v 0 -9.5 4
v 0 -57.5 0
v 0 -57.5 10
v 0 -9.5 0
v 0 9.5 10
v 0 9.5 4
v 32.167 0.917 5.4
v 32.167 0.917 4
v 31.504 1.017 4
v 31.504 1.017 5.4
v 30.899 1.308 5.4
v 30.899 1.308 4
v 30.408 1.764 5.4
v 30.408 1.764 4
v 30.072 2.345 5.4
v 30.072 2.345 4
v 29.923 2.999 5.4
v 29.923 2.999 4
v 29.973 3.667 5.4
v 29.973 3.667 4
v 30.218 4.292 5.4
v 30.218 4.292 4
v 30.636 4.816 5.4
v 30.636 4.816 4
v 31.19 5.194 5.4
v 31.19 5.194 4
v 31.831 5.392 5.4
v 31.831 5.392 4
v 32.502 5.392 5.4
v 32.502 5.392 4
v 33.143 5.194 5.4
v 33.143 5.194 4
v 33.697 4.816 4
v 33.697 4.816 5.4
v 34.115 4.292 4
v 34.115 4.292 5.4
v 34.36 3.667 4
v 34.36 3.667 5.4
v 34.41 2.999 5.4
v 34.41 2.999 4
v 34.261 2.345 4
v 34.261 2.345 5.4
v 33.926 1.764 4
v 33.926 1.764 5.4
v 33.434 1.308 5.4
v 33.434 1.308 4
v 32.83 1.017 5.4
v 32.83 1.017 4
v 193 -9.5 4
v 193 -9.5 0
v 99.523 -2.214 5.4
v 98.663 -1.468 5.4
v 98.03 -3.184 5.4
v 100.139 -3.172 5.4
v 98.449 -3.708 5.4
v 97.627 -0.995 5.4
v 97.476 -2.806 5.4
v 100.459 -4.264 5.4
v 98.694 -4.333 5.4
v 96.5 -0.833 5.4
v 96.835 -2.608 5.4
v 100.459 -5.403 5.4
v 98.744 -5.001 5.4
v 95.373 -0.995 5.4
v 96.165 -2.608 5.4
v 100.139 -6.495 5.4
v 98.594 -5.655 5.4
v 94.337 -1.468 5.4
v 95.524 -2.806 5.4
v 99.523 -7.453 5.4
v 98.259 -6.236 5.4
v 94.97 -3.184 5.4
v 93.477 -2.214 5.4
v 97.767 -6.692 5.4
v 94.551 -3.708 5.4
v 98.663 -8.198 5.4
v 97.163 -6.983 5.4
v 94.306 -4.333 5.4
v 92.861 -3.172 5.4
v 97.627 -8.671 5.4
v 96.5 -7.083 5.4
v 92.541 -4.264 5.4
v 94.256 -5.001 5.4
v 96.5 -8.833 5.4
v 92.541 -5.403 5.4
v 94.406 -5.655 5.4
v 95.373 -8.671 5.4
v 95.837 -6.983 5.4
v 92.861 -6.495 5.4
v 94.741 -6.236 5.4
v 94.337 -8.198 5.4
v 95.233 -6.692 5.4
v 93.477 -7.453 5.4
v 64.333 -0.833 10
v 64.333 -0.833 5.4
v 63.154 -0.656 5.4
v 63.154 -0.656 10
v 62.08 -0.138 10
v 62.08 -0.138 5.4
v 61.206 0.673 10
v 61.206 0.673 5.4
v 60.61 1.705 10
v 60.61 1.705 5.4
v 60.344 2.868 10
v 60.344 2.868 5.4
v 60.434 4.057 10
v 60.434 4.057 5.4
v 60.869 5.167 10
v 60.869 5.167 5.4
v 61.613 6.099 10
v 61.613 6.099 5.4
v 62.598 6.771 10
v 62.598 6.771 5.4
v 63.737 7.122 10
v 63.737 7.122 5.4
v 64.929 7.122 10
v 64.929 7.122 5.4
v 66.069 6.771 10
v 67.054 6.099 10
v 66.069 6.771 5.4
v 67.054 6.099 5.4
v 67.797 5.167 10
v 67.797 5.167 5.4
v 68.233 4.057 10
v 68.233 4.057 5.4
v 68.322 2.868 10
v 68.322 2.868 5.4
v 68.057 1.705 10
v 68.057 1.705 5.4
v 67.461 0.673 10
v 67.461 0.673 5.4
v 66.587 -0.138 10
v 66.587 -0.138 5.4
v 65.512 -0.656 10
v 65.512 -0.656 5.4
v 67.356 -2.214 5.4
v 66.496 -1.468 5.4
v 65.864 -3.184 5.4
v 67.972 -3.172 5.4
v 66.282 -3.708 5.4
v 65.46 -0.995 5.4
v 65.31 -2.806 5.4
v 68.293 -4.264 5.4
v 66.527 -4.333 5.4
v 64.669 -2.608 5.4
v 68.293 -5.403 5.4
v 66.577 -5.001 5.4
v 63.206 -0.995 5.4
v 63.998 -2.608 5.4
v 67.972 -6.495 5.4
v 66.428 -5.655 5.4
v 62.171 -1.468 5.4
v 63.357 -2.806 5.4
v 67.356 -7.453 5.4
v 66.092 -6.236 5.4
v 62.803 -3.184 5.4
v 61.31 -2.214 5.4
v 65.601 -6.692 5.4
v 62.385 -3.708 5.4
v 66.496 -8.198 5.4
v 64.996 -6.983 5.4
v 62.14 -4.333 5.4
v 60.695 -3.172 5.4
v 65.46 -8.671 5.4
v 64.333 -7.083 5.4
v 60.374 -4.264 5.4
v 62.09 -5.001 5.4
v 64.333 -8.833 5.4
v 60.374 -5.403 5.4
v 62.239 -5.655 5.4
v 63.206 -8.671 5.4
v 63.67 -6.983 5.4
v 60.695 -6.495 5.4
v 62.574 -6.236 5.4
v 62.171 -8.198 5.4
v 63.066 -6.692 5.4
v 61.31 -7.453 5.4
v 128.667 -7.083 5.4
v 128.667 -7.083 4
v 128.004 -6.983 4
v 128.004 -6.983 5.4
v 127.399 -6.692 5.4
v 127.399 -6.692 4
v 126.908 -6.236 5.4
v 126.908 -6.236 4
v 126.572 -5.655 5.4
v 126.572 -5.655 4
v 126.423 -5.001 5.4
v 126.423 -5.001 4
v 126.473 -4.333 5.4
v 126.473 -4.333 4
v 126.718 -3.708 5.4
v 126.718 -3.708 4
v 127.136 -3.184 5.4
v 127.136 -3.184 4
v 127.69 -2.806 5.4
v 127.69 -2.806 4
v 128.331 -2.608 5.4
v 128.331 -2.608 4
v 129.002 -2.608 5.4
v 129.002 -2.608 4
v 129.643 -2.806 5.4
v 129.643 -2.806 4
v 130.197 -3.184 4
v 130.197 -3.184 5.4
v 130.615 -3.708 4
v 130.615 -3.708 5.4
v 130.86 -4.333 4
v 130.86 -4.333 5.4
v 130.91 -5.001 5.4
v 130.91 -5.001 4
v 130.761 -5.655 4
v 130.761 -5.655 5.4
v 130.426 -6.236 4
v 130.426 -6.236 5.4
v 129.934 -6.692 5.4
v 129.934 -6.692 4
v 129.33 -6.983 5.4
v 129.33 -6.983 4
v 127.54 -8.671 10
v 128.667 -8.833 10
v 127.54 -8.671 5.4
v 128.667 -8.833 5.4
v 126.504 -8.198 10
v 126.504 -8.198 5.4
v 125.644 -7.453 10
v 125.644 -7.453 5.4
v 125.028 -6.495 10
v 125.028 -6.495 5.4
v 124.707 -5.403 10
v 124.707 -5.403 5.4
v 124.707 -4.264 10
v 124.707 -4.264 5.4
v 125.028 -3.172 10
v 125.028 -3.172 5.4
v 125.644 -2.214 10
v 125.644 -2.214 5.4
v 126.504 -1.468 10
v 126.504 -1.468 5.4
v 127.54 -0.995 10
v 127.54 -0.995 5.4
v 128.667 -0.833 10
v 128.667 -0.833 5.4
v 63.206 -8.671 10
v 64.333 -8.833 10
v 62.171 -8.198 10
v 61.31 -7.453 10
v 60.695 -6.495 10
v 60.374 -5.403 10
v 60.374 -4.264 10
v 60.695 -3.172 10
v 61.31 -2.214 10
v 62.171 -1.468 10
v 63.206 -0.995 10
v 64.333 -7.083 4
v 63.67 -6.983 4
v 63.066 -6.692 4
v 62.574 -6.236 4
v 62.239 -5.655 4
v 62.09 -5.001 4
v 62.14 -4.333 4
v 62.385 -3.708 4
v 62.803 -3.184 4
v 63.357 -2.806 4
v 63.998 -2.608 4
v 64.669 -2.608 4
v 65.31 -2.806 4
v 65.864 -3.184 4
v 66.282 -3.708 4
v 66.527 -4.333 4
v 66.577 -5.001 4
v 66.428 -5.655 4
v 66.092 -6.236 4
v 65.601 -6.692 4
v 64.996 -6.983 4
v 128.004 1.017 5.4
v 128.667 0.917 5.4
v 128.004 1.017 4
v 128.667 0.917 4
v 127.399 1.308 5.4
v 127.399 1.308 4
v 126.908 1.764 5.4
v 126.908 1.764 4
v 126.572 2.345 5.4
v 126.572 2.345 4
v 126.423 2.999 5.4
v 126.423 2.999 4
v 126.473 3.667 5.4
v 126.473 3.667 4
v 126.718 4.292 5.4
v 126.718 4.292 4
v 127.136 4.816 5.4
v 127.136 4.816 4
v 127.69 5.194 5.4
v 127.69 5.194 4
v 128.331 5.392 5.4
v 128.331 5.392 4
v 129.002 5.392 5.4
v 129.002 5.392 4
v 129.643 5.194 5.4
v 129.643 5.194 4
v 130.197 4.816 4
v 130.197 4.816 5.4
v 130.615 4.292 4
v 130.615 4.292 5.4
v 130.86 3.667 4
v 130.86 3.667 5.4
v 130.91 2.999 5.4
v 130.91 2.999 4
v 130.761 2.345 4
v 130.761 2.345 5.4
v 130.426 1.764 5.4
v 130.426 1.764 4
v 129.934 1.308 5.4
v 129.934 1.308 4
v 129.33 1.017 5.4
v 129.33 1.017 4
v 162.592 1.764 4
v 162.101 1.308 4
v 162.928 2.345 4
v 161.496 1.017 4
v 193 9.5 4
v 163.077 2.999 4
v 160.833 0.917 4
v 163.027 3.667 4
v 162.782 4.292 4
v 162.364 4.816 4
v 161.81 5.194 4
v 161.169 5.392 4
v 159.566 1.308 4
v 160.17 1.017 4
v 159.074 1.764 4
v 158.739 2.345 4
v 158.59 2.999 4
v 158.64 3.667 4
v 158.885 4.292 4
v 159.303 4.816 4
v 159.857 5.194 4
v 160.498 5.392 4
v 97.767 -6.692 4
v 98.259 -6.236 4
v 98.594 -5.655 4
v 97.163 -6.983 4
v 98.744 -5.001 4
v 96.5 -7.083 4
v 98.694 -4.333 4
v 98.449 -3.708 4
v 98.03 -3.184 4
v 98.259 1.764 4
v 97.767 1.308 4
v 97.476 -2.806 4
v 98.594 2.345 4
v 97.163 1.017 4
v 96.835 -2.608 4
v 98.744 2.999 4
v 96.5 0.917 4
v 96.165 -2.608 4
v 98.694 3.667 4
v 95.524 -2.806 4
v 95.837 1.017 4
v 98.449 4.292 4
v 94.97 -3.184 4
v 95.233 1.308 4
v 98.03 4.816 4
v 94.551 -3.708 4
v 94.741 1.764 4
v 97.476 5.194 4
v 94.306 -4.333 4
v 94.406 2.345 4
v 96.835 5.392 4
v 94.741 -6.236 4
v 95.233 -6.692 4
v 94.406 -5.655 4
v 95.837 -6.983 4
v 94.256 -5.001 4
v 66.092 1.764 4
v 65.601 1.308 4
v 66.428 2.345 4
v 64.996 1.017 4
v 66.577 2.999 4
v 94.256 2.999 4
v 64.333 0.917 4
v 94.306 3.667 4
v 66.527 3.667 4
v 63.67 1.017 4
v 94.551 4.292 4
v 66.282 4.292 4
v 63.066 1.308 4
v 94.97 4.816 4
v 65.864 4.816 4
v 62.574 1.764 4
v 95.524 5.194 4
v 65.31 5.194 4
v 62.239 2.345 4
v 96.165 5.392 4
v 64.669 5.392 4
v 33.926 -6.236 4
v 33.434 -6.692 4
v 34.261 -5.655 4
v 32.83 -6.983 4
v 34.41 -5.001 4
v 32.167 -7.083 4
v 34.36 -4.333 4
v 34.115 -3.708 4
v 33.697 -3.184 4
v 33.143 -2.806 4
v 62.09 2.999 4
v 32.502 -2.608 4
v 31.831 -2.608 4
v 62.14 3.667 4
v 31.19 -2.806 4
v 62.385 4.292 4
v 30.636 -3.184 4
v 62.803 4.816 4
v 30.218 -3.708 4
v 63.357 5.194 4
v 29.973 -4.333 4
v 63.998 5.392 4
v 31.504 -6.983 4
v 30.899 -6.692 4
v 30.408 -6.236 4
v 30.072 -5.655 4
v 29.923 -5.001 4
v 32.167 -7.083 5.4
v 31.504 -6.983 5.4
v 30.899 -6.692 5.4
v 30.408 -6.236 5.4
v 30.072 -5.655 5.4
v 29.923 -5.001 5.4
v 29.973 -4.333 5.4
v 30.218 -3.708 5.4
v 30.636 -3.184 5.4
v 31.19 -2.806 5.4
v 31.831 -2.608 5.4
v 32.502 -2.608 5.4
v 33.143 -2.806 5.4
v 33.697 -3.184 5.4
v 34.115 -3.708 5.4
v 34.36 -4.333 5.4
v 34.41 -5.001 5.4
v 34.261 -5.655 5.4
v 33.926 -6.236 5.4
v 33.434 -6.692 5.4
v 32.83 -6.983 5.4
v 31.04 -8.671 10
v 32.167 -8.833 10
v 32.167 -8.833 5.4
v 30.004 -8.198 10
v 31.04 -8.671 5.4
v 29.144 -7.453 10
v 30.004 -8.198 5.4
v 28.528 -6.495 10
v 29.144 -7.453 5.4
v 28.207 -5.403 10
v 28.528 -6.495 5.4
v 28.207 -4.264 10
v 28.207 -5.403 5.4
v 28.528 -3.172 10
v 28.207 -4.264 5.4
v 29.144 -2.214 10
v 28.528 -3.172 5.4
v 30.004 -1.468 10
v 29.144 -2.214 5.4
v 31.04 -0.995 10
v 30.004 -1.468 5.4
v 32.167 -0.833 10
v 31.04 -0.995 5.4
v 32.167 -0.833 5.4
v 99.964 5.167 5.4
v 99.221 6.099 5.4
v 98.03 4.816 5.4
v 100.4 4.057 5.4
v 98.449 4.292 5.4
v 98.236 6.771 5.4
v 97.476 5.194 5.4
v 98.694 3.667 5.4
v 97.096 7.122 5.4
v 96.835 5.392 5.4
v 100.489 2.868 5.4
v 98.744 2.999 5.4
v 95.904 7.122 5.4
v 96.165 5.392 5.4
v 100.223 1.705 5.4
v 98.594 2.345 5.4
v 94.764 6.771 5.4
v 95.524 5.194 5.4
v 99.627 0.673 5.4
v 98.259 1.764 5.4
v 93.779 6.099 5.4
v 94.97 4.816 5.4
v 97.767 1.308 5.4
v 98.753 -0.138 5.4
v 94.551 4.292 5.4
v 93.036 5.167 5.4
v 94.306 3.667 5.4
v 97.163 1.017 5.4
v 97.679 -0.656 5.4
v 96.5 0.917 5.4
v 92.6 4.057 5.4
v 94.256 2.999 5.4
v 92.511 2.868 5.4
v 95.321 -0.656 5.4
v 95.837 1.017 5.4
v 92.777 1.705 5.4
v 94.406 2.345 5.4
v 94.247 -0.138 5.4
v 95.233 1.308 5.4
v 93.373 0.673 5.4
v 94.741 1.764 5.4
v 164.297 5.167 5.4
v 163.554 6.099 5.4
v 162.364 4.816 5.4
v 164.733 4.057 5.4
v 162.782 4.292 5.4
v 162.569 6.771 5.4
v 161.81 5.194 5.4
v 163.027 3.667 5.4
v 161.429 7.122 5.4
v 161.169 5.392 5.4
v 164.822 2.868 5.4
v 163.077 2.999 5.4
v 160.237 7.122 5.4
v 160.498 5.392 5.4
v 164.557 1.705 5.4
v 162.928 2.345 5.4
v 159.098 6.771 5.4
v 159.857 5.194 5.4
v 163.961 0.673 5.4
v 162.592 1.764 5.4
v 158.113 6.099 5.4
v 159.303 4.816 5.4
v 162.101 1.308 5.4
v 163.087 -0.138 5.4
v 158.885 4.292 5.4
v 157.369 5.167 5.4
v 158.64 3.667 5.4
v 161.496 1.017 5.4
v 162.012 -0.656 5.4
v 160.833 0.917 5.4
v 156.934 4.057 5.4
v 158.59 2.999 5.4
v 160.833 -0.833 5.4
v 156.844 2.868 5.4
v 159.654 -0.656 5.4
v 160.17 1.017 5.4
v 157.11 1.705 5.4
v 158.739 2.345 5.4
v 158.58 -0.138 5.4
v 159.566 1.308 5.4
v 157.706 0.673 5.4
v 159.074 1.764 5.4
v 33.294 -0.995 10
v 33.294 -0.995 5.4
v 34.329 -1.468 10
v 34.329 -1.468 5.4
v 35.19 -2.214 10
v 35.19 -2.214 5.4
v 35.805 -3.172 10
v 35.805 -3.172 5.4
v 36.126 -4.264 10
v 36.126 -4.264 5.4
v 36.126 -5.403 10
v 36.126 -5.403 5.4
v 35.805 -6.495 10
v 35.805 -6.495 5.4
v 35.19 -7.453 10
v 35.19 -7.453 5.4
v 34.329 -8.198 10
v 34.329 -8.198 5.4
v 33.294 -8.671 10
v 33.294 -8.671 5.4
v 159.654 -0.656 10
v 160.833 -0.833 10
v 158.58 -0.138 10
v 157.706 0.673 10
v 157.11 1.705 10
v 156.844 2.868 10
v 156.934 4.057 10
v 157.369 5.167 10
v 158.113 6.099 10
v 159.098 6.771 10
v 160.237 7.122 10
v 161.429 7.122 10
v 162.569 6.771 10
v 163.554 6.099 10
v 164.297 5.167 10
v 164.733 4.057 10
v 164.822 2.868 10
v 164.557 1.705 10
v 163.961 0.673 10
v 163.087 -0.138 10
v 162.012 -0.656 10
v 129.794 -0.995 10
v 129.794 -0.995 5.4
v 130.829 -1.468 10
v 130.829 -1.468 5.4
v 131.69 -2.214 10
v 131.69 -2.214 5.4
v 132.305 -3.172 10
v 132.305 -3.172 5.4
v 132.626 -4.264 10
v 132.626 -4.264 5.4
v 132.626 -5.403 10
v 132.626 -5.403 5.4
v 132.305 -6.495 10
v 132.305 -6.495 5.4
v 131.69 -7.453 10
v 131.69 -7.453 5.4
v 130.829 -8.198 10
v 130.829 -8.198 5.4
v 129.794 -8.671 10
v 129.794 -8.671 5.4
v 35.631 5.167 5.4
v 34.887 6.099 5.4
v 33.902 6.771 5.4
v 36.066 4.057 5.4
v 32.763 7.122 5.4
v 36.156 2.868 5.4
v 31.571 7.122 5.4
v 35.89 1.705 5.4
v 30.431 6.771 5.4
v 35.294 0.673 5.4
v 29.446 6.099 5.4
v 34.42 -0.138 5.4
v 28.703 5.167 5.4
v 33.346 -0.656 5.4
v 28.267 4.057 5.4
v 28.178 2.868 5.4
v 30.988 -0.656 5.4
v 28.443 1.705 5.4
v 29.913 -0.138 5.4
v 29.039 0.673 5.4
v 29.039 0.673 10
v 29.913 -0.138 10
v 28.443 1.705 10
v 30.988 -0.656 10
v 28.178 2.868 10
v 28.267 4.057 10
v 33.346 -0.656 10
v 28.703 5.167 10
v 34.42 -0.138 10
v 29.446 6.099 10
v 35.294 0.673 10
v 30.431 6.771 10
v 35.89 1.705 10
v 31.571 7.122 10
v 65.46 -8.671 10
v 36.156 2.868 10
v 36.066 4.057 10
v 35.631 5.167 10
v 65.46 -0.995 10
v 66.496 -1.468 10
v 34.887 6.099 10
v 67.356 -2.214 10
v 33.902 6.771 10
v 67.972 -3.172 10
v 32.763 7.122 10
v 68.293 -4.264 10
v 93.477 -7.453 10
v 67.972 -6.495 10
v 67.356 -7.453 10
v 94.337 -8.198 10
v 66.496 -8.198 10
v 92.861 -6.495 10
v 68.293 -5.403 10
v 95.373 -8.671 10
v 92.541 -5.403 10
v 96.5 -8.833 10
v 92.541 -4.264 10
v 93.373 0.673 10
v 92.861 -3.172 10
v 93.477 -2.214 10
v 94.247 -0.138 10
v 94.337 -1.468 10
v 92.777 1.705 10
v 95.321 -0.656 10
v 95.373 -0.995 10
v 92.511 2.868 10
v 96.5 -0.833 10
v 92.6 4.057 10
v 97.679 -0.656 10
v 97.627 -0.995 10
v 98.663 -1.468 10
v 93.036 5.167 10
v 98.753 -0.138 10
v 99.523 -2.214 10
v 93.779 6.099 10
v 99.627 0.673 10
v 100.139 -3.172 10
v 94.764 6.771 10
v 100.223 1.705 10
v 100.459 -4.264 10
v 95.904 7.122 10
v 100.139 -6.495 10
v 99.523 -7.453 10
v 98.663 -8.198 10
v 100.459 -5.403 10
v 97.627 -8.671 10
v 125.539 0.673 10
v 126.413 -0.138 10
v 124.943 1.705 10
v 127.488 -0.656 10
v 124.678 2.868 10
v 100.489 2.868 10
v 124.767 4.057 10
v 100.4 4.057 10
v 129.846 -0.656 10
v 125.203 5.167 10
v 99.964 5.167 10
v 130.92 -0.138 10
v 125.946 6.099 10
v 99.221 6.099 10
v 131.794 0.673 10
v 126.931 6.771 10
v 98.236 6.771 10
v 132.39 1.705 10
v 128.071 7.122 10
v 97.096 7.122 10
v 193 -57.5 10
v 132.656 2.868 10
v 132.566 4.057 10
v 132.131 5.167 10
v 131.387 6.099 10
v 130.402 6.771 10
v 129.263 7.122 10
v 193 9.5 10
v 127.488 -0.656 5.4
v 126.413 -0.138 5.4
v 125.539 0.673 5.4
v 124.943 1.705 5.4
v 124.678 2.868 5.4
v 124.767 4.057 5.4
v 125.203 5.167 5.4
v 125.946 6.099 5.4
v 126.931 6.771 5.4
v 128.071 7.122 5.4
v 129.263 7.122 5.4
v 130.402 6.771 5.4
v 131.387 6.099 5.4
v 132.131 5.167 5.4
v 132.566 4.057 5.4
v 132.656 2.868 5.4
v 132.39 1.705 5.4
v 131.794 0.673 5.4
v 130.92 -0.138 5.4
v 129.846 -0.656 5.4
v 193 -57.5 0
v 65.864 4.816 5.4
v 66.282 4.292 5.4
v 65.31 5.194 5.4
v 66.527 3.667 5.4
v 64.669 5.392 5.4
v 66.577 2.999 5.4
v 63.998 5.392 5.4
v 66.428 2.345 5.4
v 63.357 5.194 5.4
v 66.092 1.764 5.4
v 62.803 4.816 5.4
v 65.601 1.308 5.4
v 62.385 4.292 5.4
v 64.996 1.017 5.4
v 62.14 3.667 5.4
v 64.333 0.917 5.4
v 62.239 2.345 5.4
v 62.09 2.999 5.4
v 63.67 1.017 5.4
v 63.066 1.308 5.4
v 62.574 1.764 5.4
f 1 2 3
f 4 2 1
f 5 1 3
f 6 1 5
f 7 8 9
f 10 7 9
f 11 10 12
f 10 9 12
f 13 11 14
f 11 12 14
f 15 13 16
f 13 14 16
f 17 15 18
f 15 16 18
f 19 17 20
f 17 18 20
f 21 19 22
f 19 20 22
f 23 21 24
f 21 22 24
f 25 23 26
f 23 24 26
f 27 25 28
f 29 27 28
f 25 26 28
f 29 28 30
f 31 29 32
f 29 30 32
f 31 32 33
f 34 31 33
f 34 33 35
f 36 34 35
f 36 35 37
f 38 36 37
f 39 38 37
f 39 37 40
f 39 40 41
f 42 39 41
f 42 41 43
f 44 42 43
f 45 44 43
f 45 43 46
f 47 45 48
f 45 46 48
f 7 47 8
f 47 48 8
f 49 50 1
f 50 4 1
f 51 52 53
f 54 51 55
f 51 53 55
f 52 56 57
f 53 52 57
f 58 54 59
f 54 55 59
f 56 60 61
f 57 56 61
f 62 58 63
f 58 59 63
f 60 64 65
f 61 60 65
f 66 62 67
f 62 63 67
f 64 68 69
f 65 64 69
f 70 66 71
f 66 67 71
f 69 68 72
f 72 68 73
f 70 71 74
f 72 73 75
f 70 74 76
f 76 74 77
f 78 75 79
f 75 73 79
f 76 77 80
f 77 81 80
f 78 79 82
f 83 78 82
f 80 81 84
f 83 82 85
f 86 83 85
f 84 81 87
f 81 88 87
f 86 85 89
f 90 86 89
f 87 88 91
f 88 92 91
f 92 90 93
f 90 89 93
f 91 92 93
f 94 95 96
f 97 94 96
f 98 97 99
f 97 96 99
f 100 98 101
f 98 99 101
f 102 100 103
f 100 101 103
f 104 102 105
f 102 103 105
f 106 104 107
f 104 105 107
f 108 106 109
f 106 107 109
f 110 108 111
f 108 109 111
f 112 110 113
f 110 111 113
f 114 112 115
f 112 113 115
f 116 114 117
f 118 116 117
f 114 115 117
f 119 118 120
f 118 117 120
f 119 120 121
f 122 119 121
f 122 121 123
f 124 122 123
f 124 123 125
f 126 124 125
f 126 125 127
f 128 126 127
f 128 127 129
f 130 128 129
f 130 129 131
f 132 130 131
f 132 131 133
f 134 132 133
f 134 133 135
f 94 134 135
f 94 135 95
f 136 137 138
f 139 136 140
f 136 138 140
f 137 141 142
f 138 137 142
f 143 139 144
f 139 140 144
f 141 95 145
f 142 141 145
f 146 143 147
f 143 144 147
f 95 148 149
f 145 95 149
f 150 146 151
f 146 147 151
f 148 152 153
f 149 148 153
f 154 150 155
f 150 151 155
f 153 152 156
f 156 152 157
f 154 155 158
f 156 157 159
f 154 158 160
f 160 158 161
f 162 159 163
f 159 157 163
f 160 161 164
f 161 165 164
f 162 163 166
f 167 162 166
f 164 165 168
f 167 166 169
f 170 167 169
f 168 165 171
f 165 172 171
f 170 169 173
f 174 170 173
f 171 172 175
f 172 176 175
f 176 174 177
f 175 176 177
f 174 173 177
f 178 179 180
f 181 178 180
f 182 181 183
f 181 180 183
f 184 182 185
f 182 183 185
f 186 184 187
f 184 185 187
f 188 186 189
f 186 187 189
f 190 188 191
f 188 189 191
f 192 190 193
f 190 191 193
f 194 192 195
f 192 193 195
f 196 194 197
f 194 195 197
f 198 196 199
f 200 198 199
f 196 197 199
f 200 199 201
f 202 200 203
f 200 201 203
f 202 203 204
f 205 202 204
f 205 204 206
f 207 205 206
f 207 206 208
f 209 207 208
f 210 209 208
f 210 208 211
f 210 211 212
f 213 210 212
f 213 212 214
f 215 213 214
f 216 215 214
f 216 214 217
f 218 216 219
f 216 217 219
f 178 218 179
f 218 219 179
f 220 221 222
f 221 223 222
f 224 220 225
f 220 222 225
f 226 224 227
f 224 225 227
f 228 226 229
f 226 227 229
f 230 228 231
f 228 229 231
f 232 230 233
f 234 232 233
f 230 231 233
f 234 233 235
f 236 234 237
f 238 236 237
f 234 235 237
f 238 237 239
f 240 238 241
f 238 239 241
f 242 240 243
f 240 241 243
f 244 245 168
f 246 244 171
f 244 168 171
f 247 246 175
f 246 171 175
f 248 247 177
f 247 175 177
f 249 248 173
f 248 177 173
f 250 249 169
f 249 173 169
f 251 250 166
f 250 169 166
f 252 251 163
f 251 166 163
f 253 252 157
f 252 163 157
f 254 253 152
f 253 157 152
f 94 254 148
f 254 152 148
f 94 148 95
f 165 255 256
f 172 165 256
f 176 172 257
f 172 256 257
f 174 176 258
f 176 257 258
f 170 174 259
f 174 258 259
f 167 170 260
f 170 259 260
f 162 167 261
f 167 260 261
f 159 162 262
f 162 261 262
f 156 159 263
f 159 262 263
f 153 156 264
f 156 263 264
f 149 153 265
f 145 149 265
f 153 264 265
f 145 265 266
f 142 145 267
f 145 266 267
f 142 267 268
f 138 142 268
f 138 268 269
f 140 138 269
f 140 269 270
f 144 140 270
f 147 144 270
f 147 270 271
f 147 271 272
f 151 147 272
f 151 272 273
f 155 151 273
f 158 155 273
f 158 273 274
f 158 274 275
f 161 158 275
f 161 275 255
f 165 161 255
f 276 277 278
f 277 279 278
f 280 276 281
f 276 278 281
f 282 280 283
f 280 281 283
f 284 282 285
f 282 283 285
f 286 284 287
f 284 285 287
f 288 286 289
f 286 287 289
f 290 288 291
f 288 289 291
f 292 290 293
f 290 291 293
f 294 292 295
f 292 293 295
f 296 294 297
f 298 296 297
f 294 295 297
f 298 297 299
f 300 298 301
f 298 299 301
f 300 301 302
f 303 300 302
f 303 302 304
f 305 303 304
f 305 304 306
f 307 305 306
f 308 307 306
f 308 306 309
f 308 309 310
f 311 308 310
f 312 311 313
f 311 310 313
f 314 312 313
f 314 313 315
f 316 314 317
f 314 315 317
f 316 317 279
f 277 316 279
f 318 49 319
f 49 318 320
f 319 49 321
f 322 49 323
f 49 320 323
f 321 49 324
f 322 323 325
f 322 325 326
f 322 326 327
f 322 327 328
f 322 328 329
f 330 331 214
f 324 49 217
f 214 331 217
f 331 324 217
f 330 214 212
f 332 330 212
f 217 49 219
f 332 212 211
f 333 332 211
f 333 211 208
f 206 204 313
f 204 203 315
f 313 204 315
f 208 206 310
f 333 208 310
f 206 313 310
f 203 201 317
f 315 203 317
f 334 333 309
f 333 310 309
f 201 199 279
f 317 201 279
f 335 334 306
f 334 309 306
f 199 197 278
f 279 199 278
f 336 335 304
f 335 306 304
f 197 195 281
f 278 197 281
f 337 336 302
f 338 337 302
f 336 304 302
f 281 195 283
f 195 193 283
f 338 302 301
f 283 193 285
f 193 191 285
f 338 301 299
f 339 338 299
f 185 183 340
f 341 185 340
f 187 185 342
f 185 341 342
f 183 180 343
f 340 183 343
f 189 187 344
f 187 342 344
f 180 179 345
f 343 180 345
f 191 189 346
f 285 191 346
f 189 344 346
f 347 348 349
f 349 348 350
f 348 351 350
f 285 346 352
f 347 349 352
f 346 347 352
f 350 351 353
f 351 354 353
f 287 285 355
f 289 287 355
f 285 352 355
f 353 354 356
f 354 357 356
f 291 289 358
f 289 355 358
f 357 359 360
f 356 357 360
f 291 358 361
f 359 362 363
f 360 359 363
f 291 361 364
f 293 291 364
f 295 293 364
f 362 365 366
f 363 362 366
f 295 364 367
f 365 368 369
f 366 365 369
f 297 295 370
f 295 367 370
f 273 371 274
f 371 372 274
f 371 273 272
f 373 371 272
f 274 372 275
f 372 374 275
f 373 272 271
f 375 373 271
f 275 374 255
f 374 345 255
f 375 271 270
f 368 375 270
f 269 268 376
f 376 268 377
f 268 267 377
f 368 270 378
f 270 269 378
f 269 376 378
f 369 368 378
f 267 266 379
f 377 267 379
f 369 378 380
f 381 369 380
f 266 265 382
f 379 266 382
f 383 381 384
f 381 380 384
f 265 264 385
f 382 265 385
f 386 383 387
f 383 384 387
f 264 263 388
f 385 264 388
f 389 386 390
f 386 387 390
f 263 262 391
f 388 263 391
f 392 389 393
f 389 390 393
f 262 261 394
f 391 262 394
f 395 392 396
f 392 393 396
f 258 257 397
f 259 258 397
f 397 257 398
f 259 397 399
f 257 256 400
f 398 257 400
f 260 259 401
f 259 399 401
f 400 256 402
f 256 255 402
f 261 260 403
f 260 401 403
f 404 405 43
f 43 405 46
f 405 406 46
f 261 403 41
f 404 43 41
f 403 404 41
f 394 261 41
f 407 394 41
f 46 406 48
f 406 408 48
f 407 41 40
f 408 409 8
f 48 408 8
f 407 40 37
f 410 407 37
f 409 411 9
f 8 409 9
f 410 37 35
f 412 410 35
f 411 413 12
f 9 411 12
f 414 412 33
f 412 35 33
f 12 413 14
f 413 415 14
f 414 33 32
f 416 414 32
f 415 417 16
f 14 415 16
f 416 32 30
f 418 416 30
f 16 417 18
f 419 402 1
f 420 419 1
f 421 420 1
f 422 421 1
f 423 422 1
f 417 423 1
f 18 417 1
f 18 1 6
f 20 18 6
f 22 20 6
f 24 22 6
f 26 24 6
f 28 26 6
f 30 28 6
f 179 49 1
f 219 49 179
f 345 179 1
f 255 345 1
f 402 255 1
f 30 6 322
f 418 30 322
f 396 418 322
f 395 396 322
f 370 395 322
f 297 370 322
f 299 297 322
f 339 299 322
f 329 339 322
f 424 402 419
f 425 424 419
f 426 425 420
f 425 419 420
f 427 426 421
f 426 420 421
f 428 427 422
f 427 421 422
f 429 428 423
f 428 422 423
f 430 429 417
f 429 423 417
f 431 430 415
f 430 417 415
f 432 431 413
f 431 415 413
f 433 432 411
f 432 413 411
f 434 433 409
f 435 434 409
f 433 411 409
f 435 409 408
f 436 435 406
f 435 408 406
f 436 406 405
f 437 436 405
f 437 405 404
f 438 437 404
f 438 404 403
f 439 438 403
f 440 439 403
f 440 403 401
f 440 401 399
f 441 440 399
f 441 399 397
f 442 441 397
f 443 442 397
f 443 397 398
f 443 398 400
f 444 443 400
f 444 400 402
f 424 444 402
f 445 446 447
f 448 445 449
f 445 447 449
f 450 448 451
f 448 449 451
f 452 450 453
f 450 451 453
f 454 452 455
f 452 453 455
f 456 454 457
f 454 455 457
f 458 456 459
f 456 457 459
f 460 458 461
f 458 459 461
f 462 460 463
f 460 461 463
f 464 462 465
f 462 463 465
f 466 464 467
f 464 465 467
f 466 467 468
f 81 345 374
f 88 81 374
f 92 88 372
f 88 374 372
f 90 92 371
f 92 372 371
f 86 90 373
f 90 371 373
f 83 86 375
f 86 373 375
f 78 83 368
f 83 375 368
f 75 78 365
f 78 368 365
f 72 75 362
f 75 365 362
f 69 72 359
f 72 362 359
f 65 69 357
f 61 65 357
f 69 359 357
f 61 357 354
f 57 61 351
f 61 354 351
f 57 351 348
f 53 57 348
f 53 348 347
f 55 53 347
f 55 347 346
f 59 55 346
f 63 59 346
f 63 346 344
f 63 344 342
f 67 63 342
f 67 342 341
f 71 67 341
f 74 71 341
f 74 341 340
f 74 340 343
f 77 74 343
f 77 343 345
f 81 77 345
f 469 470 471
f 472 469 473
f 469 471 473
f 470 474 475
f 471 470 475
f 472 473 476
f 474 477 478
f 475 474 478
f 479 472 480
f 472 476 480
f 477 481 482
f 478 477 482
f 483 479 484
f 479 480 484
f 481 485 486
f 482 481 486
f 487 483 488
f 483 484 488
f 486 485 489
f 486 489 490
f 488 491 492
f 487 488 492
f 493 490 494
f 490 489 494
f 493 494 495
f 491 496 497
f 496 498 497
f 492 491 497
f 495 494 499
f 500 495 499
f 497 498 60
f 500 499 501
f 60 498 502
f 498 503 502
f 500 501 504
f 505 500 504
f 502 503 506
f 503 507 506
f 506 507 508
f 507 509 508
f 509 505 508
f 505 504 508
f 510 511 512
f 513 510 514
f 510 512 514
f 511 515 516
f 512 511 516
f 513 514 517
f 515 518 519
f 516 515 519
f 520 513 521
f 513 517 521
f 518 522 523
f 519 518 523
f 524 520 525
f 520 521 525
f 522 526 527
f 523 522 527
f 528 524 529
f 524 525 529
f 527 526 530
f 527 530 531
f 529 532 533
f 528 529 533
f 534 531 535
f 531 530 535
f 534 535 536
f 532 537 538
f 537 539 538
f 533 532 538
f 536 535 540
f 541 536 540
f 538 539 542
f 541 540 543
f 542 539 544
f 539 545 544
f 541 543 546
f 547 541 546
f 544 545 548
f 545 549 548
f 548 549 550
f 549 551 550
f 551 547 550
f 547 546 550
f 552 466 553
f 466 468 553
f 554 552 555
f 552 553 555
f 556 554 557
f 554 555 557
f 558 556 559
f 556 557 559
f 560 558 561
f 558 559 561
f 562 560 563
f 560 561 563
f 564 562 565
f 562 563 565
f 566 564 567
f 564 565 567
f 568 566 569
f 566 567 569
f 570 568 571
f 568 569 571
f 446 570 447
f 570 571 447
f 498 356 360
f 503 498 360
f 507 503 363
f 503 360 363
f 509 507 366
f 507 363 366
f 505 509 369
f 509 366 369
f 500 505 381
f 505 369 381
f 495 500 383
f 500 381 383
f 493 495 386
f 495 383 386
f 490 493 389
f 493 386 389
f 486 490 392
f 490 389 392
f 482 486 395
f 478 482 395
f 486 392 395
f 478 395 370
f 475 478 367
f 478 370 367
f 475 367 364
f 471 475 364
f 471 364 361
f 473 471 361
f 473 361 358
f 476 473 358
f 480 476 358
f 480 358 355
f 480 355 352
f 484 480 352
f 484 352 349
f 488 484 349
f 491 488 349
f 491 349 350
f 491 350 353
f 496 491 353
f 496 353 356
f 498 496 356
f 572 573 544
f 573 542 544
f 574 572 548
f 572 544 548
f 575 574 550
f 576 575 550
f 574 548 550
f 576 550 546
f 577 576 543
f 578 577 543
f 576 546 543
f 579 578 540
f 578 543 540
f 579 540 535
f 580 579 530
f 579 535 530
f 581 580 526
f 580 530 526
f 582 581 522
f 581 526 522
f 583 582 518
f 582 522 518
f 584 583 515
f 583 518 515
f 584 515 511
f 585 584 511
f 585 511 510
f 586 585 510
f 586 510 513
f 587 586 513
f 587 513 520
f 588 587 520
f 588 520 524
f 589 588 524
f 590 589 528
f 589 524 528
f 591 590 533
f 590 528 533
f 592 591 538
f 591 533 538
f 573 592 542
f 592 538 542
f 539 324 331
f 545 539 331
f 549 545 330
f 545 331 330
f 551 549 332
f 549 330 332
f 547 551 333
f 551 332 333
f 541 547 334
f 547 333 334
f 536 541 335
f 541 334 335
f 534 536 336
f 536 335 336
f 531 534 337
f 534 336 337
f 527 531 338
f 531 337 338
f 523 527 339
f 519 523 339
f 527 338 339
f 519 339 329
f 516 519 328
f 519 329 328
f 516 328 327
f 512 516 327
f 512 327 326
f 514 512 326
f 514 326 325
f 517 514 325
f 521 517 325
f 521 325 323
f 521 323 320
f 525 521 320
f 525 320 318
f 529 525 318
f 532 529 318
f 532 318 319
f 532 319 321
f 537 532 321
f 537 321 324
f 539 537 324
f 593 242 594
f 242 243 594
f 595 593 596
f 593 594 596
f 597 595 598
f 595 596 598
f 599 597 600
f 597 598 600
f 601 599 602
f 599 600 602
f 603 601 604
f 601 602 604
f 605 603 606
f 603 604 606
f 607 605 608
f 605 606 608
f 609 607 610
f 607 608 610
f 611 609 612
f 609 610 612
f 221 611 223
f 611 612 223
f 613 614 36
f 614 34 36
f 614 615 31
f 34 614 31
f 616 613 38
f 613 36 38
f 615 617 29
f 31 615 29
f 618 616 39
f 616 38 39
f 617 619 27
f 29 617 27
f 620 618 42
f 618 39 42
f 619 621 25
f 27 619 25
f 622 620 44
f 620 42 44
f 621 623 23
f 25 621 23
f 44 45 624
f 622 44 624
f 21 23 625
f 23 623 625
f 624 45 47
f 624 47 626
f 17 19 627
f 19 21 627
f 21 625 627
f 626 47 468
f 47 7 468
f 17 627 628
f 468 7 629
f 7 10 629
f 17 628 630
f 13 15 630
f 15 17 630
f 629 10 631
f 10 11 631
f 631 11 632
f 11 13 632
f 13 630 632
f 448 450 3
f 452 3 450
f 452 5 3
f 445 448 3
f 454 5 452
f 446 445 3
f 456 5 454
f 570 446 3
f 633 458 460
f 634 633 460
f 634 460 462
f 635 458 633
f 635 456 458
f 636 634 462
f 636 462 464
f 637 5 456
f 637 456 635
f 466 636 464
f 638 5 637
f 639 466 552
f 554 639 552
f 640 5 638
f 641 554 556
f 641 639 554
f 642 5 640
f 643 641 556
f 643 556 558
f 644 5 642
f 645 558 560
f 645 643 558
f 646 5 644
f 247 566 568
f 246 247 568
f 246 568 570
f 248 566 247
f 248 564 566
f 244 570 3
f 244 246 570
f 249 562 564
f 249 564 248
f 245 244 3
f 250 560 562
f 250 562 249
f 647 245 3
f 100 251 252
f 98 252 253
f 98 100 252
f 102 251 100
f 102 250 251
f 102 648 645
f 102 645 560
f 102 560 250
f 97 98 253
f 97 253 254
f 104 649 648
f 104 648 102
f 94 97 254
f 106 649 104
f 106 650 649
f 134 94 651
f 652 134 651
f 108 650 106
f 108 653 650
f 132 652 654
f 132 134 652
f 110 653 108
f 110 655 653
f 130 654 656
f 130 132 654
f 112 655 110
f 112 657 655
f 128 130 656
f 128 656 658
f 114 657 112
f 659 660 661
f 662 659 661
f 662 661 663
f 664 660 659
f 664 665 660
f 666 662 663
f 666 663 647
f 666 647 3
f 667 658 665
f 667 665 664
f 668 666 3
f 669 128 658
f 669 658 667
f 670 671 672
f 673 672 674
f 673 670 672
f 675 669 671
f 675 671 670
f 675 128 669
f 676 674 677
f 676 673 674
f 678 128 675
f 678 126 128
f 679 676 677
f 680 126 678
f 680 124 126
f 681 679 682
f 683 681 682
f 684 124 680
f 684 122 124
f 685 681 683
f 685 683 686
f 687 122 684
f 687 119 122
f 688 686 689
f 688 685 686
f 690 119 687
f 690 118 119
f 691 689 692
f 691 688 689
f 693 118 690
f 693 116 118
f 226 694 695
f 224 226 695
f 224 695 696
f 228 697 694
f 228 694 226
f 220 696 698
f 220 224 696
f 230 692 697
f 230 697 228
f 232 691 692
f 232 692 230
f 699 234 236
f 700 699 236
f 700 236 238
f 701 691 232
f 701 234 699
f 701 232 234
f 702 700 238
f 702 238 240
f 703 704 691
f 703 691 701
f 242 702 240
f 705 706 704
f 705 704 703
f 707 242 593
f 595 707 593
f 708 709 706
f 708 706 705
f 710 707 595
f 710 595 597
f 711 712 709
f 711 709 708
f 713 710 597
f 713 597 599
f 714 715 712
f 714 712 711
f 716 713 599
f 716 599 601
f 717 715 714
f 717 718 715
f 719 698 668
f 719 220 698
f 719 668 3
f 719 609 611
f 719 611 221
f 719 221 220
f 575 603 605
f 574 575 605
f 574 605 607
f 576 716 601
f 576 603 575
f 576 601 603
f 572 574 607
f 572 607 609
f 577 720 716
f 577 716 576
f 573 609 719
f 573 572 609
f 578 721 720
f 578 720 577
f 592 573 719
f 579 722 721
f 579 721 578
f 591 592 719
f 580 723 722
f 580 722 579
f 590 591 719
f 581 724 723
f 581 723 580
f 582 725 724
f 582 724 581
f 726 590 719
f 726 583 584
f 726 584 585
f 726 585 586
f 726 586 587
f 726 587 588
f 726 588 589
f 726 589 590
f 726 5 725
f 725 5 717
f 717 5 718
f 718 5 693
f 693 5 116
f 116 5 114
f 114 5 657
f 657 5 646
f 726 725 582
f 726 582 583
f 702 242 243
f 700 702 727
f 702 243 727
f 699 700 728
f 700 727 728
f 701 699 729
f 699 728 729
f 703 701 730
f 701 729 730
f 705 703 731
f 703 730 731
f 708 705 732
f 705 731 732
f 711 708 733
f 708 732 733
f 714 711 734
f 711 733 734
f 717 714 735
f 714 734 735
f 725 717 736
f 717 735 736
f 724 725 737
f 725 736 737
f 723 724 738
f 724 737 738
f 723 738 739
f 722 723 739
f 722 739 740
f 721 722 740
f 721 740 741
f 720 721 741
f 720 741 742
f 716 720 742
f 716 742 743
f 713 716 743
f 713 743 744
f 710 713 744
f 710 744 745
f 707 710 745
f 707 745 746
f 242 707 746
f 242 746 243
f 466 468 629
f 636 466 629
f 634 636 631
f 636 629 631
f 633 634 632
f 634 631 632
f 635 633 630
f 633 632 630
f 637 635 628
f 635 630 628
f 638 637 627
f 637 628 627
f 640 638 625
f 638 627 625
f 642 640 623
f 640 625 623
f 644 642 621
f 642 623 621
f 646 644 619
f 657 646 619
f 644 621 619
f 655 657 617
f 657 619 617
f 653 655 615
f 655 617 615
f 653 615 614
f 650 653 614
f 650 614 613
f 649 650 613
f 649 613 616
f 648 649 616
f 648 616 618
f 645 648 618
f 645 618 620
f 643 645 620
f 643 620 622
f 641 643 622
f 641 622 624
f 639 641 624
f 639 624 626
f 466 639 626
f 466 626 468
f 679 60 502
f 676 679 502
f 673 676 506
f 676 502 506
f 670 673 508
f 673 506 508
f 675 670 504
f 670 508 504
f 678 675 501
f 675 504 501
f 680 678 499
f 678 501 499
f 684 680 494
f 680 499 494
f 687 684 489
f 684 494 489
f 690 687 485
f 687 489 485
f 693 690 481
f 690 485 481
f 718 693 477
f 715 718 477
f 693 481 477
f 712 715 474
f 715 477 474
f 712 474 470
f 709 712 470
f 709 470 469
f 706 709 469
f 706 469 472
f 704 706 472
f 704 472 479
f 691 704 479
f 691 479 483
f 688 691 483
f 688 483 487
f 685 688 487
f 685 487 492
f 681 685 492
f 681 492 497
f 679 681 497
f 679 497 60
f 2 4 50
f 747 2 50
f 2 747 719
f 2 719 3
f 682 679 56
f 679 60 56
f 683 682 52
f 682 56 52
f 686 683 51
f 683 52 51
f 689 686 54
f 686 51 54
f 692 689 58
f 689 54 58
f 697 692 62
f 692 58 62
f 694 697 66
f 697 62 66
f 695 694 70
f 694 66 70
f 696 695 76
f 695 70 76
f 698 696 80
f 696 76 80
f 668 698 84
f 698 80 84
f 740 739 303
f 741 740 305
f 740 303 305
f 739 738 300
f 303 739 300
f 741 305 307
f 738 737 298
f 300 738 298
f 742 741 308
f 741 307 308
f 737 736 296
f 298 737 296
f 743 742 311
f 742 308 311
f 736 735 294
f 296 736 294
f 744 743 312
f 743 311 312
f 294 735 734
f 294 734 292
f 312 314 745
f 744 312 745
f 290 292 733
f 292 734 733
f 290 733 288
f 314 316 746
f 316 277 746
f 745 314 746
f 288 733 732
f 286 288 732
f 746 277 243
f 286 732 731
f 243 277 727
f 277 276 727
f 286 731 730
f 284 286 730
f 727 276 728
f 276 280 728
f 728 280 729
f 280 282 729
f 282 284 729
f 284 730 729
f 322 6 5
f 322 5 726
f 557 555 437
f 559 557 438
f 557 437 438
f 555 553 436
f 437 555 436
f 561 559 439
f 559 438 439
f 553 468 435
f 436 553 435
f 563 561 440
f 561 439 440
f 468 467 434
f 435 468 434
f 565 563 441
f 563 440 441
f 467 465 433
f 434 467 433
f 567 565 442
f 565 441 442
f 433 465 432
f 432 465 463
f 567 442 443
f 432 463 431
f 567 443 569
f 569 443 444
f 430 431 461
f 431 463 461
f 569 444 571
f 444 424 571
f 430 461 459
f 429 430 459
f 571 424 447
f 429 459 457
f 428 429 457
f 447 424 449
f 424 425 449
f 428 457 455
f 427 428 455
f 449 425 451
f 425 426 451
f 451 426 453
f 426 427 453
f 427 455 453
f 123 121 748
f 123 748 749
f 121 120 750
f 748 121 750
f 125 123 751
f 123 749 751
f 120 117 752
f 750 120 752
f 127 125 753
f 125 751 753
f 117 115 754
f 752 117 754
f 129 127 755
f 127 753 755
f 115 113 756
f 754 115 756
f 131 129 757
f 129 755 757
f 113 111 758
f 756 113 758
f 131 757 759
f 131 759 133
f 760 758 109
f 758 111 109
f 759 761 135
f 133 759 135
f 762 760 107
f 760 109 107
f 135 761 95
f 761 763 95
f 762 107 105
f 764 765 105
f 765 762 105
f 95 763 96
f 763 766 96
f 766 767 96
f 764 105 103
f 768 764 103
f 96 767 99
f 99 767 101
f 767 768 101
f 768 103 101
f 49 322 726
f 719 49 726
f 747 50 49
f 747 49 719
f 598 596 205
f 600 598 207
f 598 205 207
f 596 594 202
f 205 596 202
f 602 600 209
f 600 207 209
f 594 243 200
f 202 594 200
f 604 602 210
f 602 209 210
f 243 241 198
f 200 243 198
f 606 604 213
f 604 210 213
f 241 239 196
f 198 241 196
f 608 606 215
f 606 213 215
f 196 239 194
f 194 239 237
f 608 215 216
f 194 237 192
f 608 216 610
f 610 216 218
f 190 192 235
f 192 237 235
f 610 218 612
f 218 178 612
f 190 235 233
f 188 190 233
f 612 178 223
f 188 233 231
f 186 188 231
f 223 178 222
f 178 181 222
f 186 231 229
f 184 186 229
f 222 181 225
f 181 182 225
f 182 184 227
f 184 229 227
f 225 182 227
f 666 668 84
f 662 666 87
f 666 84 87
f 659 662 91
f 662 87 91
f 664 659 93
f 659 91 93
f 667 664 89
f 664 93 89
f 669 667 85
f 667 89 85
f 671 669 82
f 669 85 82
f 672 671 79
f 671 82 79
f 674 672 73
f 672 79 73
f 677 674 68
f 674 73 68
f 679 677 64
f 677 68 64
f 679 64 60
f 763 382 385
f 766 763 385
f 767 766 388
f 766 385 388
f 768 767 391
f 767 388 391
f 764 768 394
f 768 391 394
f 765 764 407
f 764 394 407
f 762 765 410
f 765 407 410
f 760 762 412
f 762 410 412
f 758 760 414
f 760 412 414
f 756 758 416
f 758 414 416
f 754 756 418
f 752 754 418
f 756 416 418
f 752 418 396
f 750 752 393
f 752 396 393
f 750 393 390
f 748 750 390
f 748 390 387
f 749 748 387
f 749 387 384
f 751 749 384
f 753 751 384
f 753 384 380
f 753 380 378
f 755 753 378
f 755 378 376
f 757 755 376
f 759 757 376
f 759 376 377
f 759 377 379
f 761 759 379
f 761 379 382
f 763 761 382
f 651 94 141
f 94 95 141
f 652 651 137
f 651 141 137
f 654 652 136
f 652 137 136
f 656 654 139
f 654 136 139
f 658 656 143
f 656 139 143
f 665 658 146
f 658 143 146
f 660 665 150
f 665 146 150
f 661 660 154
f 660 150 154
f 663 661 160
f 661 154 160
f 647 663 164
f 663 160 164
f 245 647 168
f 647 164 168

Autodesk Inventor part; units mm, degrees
ref_plane "YZ Plane" through (0, 0, 0) normal (1, 0, 0) x (0, 1, 0)
ref_plane "XZ Plane" through (0, 0, 0) normal (0, 1, 0) x (-1, 0, 0)
ref_plane "XY Plane" through (0, 0, 0) normal (0, 0, 1) x (1, 0, 0)
sketch "Sketch1" plane through (0, 0, 0) normal (0, 0, 1) x (1, 0, 0)
  line L0 (148.5, -9.5) -> (148.5, -6.2) construction
  line L1 (148.5, -6.2) -> (193, -6.2) construction
  line L2 (193, 9.5) -> (193, -6.2) construction
  line L3 (0, 9.5) -> (193, 9.5) construction
  line L4 (0, -9.5) -> (0, 9.5) construction
  line L5 (148.5, -9.5) -> (0, -9.5) construction
  line L6 (0, 9.5) -> (193, 9.5)
  line L7 (193, 9.5) -> (193, -57.5)
  line L8 (193, -57.5) -> (0, -57.5)
  line L9 (0, -57.5) -> (0, 9.5)
  circle A0 centre (128.6667, -4.8333) radius 1.621 projected
  circle A1 centre (96.5, 3.1667) radius 1.621 projected
  circle A2 centre (64.3333, -4.8333) radius 1.621 projected
  circle A3 centre (32.1667, 3.1667) radius 1.621 projected
  circle A4 centre (32.1667, -4.8333) radius 1.621 projected
  circle A5 centre (64.3333, 3.1667) radius 1.621 projected
  circle A6 centre (96.5, -4.8333) radius 1.621 projected
  circle A7 centre (128.6667, 3.1667) radius 1.621 projected
  circle A8 centre (160.8333, 3.1667) radius 1.621 projected
  point P0 (0, 0)
extrude "Extrusion1" add sketch "Sketch1" along normal blind 10 contours L6 L7 L8 L9 | A0 | A1 | A2 | A3 | A4 | A5 | A6 | A7 | A8
sketch "Sketch2" plane through (0, -57.5, 0) normal (-1, 0, 0) x (0, 0, 1)
  line L0 (-111.7541, 55) -> (-111.7541, 67) construction
  line L1 (-116, 67) -> (-111.7541, 67) construction
  line L2 (-116, 48) -> (-116, 67) construction
  line L3 (4, 48) -> (-116, 48) construction
  line L4 (4, 48) -> (4, 67) construction
  line L5 (-54.7541, 67) -> (4, 67) construction
  line L6 (-54.7541, 67) -> (-54.7541, 55) construction
  line L7 (-54.7541, 55) -> (-111.7541, 55) construction
  line L8 (0, 67) -> (0, 0) projected
  line L9 (4, 67) -> (0, 67)
  line L10 (0, 67) -> (0, 48)
  line L11 (0, 48) -> (4, 48)
  line L12 (4, 48) -> (4, 67)
  point P0 (0, 57.5)
extrude "Extrusion2" cut sketch "Sketch2" against normal through all
sketch "Sketch3" plane through (0, 0, 10) normal (0, 0, 1) x (1, 0, 0)
  line L0 (193, -9.5) -> (193, 9.5) projected
  line L1 (0, -9.5) -> (193, -9.5) projected
  line L2 (0, 9.5) -> (0, -9.5) projected
  line L3 (193, 9.5) -> (0, 9.5) projected
  line L4 (0, 0) -> (193, 0) construction
  point P0 (32.1667, 3.1667)
  point P1 (64.3333, 3.1667)
  point P2 (96.5, 3.1667)
  point P3 (128.6667, 3.1667)
  point P4 (160.8333, 3.1667)
  point P5 (32.1667, -4.8333)
  point P6 (64.3333, -4.8333)
  point P7 (96.5, -4.8333)
  point P8 (128.6667, -4.8333)
  point P9 (160.8333, -4.8333)
  dimension "d4" = 32.1667
  dimension "d5" = 32.1667
  dimension "d6" = 32.1667
  dimension "d7" = 32.1667
  dimension "d8" = 32.1667
  dimension "d9" = 8
  dimension "d10" = 6.3333
hole "Hole1" at (32.1667, 3.1667, 10) at (64.3333, 3.1667, 10) at (96.5, 3.1667, 10) at (128.6667, 3.1667, 10) at (160.8333, 3.1667, 10) at (32.1667, -4.8333, 10) at (64.3333, -4.8333, 10) at (96.5, -4.8333, 10) at (128.6667, -4.8333, 10) direction (0, 0, -1) diameter 4.5 depth 14.2 counterbore diameter 8 counterbore depth 4.6 clearance for "Socket Head Cap Screw ISO 4762" size "M4" standard "ISO"
equation "\"d5\" = d4"
equation "\"d6\" = d4"
equation "\"d7\" = d6"
equation "\"d8\" = d7"
properties part number "foot bracket foot backside"
